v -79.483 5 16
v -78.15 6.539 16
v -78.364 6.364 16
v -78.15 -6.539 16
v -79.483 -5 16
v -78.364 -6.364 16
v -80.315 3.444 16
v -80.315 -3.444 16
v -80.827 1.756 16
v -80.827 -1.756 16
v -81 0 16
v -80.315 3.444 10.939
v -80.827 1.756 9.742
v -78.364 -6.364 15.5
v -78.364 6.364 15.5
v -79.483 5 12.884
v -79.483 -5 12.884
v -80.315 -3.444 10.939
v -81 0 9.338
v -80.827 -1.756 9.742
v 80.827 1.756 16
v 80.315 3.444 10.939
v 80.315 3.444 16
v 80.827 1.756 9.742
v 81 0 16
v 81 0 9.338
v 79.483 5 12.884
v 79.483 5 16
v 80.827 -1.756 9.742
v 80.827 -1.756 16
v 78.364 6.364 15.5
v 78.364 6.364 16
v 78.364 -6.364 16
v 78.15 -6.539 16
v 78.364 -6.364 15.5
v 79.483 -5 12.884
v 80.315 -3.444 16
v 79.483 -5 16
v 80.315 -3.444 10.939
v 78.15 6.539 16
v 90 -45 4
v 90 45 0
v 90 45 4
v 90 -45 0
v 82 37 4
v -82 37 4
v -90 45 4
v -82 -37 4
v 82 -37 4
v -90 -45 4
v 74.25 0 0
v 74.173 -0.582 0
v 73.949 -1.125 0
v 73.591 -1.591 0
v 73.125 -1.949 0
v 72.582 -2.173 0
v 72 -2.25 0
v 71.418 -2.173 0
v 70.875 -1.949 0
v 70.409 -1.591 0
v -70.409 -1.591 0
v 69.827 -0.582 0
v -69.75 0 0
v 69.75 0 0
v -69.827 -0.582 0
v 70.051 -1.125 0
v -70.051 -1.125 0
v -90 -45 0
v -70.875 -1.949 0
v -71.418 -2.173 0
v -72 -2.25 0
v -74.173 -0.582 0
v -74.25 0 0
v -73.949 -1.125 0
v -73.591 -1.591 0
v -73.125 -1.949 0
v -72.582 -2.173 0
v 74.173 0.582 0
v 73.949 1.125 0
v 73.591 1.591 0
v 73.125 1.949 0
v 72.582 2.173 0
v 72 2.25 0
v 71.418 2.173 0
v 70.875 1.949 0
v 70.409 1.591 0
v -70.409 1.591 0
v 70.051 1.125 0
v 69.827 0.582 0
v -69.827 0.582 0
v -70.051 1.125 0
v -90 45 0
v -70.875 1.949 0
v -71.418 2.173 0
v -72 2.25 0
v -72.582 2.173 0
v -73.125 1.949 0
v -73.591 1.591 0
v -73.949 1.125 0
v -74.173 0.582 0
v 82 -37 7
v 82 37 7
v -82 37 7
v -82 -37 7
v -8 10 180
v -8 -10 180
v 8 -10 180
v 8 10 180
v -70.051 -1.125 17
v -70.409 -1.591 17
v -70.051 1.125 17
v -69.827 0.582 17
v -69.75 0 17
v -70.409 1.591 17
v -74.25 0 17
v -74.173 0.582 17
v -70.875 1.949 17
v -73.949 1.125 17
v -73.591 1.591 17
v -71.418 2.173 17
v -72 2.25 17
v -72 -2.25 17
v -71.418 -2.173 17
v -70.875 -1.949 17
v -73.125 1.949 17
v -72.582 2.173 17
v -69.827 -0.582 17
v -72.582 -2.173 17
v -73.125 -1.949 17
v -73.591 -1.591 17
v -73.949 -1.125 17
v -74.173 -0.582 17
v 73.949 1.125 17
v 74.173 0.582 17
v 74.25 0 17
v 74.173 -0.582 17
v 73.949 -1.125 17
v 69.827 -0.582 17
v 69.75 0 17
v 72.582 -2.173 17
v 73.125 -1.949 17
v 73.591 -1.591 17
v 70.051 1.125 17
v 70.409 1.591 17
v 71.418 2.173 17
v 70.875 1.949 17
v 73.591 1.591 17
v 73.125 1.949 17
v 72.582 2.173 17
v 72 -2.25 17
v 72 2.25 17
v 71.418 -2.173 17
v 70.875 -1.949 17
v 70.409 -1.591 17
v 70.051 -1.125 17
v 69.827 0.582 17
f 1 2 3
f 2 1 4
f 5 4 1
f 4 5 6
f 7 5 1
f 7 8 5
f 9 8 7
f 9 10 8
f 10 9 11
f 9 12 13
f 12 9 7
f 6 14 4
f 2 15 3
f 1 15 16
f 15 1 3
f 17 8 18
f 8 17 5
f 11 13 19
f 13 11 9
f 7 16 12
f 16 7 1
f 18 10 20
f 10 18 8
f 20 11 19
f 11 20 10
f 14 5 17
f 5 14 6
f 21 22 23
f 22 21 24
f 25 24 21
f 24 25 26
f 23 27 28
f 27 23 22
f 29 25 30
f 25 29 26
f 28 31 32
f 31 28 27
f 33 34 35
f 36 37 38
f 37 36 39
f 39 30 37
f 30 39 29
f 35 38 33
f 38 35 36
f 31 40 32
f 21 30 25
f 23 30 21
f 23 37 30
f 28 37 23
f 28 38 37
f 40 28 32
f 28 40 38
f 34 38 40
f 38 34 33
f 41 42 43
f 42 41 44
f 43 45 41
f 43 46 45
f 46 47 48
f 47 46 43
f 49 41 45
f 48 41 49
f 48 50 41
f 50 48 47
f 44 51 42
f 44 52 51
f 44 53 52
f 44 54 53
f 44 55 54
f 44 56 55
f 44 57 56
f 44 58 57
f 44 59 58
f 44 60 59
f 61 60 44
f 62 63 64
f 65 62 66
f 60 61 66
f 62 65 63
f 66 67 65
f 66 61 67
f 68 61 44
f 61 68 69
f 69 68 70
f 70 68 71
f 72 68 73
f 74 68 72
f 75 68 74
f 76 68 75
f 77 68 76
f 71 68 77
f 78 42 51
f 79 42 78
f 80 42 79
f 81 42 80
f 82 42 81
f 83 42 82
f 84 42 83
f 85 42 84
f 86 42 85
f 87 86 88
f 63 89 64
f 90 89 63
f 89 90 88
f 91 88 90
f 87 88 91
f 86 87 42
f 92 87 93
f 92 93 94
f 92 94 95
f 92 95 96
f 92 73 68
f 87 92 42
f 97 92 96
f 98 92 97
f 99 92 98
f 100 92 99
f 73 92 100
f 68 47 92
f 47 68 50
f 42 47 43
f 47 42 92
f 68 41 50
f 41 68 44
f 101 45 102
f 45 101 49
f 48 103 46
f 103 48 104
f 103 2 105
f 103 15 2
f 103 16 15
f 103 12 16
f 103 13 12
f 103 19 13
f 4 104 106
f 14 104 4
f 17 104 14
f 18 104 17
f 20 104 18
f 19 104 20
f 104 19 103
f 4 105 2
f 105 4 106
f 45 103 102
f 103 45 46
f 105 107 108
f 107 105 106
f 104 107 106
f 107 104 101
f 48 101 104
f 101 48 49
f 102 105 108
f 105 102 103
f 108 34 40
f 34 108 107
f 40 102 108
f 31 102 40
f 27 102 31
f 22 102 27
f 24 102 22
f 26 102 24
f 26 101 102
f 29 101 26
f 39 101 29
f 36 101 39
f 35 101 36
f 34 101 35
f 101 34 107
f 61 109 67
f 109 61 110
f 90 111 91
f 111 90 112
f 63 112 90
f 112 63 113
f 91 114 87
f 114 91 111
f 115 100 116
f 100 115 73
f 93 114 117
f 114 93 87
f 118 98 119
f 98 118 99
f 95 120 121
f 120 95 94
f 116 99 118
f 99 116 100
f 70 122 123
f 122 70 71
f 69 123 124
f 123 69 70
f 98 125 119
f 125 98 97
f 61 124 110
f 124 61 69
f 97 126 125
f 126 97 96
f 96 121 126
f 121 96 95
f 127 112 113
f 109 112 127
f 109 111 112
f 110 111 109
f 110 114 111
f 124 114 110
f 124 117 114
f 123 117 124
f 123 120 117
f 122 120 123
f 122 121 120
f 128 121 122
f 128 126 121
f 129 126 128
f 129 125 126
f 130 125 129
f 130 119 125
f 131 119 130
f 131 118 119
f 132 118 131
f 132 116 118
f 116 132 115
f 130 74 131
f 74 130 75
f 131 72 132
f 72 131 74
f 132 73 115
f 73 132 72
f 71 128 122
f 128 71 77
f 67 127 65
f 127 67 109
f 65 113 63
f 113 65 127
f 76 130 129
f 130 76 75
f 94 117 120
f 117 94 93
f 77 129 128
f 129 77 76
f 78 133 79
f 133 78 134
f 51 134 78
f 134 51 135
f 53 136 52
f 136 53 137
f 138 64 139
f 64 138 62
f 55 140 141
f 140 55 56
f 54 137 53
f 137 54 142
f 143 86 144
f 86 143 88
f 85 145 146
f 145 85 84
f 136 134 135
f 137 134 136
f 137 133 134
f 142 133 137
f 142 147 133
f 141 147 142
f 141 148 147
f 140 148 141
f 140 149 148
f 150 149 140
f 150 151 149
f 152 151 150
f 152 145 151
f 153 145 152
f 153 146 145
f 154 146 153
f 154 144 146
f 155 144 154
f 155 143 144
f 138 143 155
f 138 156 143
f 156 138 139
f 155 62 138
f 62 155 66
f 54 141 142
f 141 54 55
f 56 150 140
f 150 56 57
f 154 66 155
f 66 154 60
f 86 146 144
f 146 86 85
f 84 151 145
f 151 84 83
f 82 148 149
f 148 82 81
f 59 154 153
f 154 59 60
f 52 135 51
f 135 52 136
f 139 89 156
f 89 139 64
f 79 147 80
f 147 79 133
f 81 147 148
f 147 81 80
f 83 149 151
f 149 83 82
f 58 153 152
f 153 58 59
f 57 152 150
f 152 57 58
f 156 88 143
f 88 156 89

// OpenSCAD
wedge_length=180; wedge_width=90; wedge_height=180; base_thickness=4; mount_hole_diameter=4.5;
module split_wedge(){ difference(){ union(){ translate([-wedge_length/2,-wedge_width/2,0]) cube([wedge_length,wedge_width,base_thickness]); hull(){ translate([-wedge_length/2+8,-wedge_width/2+8,base_thickness]) cube([wedge_length-16,wedge_width-16,3]); translate([-8,-10,wedge_height-10]) cube([16,20,10]); } for(x=[-72,72]) translate([x,0,base_thickness]) cylinder(d=18,h=12,$fn=32); } for(x=[-72,72]) translate([x,0,-1]) cylinder(d=mount_hole_diameter,h=18,$fn=24); }}
assert(wedge_height==180 && wedge_length==180); echo("SCADCTL_REQUIREMENT:parameters:PASS"); split_wedge();
